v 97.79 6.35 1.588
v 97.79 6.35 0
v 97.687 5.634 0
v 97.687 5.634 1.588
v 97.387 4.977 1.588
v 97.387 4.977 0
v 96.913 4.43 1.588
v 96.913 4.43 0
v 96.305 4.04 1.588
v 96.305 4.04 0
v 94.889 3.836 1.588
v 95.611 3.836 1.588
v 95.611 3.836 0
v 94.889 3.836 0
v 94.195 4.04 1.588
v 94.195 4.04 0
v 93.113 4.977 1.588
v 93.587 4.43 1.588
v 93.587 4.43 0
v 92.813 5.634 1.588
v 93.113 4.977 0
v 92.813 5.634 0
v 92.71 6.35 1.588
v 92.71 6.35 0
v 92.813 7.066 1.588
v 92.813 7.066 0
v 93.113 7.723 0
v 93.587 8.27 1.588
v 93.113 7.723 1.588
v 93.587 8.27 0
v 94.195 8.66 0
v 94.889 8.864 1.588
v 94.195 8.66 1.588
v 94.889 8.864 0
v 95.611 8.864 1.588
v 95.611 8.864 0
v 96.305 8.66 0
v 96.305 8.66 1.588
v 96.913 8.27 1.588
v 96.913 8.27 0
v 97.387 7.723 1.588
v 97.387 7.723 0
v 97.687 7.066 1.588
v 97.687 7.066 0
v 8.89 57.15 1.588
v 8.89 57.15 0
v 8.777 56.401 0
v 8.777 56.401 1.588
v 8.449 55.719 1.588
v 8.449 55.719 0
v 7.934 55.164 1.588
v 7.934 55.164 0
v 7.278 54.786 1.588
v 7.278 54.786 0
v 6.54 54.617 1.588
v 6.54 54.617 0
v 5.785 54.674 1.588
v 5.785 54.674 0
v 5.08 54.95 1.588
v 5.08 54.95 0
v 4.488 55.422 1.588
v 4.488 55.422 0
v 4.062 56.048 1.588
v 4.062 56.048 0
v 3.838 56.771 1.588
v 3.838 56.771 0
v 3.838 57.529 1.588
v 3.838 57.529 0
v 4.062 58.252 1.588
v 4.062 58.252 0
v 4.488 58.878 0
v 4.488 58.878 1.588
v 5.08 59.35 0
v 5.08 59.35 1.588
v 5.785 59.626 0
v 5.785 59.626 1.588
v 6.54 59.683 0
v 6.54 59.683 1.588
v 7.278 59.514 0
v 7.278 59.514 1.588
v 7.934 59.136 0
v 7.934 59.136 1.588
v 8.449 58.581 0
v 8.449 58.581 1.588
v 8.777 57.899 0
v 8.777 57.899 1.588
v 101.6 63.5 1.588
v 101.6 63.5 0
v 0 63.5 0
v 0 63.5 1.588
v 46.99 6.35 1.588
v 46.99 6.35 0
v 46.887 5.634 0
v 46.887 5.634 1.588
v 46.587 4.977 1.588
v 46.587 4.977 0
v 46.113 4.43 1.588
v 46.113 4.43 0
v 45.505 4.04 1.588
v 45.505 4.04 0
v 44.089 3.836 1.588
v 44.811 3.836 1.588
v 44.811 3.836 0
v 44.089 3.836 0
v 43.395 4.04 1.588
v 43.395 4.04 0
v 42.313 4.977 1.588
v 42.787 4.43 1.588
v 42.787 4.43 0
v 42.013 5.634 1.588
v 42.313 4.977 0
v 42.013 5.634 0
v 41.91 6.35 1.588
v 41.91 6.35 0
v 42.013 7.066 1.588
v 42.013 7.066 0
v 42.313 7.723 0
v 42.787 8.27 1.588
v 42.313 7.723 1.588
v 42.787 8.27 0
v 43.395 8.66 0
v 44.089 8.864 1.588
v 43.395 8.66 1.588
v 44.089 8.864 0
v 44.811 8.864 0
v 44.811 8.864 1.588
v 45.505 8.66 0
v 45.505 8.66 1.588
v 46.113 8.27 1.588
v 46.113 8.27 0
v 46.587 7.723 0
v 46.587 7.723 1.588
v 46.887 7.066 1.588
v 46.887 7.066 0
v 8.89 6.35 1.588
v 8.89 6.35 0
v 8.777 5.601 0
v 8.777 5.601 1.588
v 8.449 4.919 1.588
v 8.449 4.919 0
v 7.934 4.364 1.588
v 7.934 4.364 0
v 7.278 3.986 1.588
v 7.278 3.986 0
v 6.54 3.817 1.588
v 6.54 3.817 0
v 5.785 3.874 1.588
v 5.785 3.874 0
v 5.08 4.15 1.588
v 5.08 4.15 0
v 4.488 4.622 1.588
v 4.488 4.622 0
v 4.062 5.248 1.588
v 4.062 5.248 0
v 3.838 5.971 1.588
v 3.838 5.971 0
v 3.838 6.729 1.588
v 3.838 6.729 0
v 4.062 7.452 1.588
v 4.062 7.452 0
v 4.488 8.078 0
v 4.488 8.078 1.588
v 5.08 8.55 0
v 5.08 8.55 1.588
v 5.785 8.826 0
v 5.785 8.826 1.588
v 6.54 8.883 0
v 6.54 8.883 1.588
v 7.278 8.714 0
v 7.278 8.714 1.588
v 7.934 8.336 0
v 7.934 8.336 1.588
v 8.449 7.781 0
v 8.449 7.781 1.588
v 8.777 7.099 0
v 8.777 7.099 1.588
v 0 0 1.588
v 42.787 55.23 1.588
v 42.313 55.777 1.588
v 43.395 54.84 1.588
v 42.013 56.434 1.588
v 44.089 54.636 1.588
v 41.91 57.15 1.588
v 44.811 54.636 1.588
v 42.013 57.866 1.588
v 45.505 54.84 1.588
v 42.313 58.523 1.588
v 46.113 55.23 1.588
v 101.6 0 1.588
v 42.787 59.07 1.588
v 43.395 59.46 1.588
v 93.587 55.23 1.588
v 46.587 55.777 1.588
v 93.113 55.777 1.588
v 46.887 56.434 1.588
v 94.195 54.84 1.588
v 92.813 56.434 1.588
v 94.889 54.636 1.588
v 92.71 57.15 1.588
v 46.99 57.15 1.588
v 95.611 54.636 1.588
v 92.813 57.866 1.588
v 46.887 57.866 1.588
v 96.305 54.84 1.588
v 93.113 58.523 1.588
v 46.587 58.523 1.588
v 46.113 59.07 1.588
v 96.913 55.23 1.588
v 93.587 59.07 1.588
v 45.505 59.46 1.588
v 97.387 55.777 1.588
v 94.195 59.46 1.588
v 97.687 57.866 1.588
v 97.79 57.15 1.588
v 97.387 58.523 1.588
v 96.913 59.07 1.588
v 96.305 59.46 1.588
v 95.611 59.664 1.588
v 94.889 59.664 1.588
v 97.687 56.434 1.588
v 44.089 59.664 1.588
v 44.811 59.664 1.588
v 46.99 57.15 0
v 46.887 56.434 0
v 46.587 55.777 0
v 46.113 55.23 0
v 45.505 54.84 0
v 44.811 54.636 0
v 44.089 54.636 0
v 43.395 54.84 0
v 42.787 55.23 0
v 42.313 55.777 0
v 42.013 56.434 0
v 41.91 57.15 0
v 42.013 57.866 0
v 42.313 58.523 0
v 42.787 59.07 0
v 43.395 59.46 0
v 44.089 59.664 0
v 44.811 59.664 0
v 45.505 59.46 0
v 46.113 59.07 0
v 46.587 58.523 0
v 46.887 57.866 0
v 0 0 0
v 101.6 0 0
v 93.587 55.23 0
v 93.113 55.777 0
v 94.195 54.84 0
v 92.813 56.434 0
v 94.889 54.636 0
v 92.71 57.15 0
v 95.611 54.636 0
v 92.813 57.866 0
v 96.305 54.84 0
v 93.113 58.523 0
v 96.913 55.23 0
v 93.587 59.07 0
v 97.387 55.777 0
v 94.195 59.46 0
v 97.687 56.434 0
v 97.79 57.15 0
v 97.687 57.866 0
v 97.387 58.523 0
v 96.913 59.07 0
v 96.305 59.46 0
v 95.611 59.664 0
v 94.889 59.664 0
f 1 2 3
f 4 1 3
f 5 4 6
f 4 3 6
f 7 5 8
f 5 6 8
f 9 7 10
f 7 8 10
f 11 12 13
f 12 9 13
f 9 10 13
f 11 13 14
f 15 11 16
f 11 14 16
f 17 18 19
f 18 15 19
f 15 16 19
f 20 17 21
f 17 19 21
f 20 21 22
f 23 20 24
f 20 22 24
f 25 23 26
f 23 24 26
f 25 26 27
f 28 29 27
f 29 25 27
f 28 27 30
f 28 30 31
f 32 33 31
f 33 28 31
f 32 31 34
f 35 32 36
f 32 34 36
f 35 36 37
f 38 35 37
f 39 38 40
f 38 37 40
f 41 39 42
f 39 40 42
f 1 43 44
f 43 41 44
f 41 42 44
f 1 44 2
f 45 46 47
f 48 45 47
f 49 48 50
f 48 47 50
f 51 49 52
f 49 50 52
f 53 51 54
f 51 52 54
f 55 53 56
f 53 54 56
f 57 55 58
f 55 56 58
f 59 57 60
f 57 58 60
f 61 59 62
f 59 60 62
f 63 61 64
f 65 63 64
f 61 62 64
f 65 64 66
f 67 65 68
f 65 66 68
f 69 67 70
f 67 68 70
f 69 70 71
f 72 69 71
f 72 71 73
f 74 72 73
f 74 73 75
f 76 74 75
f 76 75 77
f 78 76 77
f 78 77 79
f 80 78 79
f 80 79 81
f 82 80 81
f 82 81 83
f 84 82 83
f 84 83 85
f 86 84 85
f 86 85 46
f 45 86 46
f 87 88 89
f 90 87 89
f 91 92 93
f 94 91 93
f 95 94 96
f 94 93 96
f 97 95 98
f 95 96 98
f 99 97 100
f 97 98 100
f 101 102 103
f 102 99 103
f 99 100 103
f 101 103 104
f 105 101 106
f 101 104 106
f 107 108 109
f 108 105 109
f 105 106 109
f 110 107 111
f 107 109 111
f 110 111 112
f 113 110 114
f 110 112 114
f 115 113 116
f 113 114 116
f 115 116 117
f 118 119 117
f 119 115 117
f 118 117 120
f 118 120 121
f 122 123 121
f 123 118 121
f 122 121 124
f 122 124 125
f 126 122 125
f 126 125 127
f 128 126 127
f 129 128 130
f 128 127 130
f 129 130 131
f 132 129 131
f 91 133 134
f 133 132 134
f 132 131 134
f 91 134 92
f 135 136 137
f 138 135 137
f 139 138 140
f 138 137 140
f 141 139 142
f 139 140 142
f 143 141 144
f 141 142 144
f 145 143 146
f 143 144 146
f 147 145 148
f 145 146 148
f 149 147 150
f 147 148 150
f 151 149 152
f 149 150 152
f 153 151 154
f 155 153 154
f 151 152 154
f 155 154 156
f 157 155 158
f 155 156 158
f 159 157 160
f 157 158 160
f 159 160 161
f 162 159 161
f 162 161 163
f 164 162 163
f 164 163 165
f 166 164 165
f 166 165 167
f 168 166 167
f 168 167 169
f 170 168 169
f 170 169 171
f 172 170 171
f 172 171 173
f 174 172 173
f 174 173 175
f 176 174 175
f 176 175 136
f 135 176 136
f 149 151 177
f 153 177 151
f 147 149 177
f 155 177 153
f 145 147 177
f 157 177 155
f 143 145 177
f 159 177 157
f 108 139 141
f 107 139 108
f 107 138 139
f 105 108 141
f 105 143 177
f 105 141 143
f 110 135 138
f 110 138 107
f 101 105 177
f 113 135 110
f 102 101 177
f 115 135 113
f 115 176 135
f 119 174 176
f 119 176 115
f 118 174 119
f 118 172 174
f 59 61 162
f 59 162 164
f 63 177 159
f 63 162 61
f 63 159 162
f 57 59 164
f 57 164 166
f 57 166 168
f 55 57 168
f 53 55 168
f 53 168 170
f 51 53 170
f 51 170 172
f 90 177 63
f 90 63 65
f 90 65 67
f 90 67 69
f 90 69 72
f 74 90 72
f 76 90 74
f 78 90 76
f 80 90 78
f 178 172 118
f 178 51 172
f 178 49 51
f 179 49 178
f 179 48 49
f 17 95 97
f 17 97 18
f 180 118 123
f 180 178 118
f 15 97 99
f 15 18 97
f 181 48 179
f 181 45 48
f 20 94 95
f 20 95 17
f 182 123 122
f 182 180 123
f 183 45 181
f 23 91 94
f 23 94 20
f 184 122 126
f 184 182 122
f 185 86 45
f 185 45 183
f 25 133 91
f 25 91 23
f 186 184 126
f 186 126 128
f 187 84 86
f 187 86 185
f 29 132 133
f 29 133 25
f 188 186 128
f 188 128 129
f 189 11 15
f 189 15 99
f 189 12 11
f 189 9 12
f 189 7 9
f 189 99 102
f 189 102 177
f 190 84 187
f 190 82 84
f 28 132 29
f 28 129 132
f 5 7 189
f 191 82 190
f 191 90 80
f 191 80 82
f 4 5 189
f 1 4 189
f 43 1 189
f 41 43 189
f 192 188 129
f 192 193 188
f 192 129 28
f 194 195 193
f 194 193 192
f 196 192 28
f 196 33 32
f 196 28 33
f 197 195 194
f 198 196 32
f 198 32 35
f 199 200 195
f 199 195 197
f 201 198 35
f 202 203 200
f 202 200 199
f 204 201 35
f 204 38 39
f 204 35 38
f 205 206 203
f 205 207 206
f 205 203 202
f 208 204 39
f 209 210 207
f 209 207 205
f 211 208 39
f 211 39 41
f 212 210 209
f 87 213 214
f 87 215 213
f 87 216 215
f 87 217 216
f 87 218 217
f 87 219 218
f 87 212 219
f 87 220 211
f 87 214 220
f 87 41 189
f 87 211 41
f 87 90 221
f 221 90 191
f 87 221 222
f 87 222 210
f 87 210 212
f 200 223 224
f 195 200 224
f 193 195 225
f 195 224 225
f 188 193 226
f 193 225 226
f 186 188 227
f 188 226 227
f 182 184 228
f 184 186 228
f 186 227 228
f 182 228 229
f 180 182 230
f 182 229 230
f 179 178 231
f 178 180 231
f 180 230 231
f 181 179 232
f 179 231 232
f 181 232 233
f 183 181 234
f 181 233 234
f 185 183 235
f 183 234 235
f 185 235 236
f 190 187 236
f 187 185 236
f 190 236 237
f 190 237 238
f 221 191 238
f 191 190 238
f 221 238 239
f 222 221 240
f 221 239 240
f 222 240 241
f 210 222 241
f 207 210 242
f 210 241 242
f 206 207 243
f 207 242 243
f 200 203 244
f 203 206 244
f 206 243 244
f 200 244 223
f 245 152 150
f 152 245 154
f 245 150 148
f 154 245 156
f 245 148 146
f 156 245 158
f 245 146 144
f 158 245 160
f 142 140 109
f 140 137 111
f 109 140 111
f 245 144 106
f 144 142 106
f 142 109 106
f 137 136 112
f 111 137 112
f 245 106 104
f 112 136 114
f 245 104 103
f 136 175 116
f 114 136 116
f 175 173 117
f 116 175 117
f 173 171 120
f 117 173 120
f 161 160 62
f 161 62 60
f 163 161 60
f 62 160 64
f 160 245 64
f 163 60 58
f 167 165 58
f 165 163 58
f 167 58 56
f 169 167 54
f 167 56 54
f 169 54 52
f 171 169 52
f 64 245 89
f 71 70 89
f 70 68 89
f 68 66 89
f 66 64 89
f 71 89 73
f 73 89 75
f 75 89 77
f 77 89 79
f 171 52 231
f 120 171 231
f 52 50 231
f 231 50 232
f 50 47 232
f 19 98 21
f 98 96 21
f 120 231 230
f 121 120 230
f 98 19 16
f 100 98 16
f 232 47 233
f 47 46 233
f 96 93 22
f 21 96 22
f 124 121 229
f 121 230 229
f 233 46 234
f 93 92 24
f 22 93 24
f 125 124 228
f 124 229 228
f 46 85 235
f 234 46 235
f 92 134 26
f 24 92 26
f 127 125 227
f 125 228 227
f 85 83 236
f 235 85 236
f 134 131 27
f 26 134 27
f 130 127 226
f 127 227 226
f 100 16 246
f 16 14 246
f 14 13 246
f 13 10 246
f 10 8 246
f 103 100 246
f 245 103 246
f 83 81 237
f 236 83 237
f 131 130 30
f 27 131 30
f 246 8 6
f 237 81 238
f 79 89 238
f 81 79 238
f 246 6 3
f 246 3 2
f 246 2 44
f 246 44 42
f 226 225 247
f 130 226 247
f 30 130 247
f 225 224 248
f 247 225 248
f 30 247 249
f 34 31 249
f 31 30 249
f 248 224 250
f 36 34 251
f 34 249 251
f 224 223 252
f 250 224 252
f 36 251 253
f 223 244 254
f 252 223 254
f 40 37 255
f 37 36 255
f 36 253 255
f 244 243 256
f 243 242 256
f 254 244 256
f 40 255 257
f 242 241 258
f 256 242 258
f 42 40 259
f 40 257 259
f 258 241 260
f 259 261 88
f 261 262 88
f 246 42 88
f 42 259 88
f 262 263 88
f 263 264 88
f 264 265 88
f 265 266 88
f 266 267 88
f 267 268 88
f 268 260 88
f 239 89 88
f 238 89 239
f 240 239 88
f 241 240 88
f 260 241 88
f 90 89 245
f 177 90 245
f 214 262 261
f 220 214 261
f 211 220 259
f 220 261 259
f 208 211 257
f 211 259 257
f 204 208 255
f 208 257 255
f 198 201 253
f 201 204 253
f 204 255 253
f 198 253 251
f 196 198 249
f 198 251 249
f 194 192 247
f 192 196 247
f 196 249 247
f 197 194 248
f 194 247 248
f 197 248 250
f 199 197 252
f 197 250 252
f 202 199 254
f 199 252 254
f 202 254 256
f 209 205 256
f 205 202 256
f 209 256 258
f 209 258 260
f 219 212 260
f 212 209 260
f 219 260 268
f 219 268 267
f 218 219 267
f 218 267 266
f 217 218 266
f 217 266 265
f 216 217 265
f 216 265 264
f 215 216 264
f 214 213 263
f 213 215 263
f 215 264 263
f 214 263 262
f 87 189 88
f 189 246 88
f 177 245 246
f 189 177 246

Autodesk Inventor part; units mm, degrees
ref_plane "YZ Plane" through (0, 0, 0) normal (1, 0, 0) x (0, 1, 0)
ref_plane "XZ Plane" through (0, 0, 0) normal (0, 1, 0) x (-1, 0, 0)
ref_plane "XY Plane" through (0, 0, 0) normal (0, 0, 1) x (1, 0, 0)
sketch "Sketch1" plane through (0, 0, 0) normal (0, 0, 1) x (1, 0, 0)
  line L0 (0, 0) -> (101.6, 0)
  line L1 (101.6, 0) -> (101.6, 63.5)
  line L2 (101.6, 63.5) -> (0, 63.5)
  line L3 (0, 63.5) -> (0, 0)
  line L4 (7.1778, 63.5) -> (7.1778, 57.15)
  line L5 (0, 57.15) -> (6.35, 57.15)
  line L6 (6.35, 57.15) -> (44.45, 57.15)
  line L7 (44.45, 57.15) -> (95.25, 57.15)
  circle A0 centre (44.45, 57.15) radius 2.54
  circle A1 centre (95.25, 57.15) radius 2.54
  circle A2 centre (6.35, 57.15) radius 2.54
  line L8 (6.35, 0) -> (6.35, 6.35)
  line L9 (0, 6.35) -> (6.35, 6.35)
  line L10 (6.35, 6.35) -> (44.45, 6.35)
  line L11 (44.45, 6.35) -> (69.85, 6.35)
  line L12 (69.85, 6.35) -> (95.25, 6.35)
  circle A3 centre (6.35, 6.35) radius 2.54
  circle A4 centre (44.45, 6.35) radius 2.54
  circle A5 centre (95.25, 6.35) radius 2.54
  dimension "d0" = 101.6
  dimension "d1" = 63.5
  dimension "d2" = 6.35
  dimension "d3" = 6.35
  dimension "d5" = 38.1
  dimension "d6" = 50.8
  dimension "d7" = 5.08
  dimension "d8" = 5.08
  dimension "d9" = 5.08
  dimension "d12" = 6.35
  dimension "d13" = 6.35
  dimension "d14" = 38.1
  dimension "d15" = 25.4
  dimension "d16" = 25.4
  dimension "d17" = 5.08
  dimension "d18" = 5.08
  dimension "d19" = 5.08
extrude "Extrusion1" add sketch "Sketch1" along normal blind 1.5875 contours L3 L9 A3 L8 L0 | L8 A3 L9 L3 L5 A2 L4 L2 L1 L0 | L3 L2 L4 A2 L5
properties part number "kickPlate"
